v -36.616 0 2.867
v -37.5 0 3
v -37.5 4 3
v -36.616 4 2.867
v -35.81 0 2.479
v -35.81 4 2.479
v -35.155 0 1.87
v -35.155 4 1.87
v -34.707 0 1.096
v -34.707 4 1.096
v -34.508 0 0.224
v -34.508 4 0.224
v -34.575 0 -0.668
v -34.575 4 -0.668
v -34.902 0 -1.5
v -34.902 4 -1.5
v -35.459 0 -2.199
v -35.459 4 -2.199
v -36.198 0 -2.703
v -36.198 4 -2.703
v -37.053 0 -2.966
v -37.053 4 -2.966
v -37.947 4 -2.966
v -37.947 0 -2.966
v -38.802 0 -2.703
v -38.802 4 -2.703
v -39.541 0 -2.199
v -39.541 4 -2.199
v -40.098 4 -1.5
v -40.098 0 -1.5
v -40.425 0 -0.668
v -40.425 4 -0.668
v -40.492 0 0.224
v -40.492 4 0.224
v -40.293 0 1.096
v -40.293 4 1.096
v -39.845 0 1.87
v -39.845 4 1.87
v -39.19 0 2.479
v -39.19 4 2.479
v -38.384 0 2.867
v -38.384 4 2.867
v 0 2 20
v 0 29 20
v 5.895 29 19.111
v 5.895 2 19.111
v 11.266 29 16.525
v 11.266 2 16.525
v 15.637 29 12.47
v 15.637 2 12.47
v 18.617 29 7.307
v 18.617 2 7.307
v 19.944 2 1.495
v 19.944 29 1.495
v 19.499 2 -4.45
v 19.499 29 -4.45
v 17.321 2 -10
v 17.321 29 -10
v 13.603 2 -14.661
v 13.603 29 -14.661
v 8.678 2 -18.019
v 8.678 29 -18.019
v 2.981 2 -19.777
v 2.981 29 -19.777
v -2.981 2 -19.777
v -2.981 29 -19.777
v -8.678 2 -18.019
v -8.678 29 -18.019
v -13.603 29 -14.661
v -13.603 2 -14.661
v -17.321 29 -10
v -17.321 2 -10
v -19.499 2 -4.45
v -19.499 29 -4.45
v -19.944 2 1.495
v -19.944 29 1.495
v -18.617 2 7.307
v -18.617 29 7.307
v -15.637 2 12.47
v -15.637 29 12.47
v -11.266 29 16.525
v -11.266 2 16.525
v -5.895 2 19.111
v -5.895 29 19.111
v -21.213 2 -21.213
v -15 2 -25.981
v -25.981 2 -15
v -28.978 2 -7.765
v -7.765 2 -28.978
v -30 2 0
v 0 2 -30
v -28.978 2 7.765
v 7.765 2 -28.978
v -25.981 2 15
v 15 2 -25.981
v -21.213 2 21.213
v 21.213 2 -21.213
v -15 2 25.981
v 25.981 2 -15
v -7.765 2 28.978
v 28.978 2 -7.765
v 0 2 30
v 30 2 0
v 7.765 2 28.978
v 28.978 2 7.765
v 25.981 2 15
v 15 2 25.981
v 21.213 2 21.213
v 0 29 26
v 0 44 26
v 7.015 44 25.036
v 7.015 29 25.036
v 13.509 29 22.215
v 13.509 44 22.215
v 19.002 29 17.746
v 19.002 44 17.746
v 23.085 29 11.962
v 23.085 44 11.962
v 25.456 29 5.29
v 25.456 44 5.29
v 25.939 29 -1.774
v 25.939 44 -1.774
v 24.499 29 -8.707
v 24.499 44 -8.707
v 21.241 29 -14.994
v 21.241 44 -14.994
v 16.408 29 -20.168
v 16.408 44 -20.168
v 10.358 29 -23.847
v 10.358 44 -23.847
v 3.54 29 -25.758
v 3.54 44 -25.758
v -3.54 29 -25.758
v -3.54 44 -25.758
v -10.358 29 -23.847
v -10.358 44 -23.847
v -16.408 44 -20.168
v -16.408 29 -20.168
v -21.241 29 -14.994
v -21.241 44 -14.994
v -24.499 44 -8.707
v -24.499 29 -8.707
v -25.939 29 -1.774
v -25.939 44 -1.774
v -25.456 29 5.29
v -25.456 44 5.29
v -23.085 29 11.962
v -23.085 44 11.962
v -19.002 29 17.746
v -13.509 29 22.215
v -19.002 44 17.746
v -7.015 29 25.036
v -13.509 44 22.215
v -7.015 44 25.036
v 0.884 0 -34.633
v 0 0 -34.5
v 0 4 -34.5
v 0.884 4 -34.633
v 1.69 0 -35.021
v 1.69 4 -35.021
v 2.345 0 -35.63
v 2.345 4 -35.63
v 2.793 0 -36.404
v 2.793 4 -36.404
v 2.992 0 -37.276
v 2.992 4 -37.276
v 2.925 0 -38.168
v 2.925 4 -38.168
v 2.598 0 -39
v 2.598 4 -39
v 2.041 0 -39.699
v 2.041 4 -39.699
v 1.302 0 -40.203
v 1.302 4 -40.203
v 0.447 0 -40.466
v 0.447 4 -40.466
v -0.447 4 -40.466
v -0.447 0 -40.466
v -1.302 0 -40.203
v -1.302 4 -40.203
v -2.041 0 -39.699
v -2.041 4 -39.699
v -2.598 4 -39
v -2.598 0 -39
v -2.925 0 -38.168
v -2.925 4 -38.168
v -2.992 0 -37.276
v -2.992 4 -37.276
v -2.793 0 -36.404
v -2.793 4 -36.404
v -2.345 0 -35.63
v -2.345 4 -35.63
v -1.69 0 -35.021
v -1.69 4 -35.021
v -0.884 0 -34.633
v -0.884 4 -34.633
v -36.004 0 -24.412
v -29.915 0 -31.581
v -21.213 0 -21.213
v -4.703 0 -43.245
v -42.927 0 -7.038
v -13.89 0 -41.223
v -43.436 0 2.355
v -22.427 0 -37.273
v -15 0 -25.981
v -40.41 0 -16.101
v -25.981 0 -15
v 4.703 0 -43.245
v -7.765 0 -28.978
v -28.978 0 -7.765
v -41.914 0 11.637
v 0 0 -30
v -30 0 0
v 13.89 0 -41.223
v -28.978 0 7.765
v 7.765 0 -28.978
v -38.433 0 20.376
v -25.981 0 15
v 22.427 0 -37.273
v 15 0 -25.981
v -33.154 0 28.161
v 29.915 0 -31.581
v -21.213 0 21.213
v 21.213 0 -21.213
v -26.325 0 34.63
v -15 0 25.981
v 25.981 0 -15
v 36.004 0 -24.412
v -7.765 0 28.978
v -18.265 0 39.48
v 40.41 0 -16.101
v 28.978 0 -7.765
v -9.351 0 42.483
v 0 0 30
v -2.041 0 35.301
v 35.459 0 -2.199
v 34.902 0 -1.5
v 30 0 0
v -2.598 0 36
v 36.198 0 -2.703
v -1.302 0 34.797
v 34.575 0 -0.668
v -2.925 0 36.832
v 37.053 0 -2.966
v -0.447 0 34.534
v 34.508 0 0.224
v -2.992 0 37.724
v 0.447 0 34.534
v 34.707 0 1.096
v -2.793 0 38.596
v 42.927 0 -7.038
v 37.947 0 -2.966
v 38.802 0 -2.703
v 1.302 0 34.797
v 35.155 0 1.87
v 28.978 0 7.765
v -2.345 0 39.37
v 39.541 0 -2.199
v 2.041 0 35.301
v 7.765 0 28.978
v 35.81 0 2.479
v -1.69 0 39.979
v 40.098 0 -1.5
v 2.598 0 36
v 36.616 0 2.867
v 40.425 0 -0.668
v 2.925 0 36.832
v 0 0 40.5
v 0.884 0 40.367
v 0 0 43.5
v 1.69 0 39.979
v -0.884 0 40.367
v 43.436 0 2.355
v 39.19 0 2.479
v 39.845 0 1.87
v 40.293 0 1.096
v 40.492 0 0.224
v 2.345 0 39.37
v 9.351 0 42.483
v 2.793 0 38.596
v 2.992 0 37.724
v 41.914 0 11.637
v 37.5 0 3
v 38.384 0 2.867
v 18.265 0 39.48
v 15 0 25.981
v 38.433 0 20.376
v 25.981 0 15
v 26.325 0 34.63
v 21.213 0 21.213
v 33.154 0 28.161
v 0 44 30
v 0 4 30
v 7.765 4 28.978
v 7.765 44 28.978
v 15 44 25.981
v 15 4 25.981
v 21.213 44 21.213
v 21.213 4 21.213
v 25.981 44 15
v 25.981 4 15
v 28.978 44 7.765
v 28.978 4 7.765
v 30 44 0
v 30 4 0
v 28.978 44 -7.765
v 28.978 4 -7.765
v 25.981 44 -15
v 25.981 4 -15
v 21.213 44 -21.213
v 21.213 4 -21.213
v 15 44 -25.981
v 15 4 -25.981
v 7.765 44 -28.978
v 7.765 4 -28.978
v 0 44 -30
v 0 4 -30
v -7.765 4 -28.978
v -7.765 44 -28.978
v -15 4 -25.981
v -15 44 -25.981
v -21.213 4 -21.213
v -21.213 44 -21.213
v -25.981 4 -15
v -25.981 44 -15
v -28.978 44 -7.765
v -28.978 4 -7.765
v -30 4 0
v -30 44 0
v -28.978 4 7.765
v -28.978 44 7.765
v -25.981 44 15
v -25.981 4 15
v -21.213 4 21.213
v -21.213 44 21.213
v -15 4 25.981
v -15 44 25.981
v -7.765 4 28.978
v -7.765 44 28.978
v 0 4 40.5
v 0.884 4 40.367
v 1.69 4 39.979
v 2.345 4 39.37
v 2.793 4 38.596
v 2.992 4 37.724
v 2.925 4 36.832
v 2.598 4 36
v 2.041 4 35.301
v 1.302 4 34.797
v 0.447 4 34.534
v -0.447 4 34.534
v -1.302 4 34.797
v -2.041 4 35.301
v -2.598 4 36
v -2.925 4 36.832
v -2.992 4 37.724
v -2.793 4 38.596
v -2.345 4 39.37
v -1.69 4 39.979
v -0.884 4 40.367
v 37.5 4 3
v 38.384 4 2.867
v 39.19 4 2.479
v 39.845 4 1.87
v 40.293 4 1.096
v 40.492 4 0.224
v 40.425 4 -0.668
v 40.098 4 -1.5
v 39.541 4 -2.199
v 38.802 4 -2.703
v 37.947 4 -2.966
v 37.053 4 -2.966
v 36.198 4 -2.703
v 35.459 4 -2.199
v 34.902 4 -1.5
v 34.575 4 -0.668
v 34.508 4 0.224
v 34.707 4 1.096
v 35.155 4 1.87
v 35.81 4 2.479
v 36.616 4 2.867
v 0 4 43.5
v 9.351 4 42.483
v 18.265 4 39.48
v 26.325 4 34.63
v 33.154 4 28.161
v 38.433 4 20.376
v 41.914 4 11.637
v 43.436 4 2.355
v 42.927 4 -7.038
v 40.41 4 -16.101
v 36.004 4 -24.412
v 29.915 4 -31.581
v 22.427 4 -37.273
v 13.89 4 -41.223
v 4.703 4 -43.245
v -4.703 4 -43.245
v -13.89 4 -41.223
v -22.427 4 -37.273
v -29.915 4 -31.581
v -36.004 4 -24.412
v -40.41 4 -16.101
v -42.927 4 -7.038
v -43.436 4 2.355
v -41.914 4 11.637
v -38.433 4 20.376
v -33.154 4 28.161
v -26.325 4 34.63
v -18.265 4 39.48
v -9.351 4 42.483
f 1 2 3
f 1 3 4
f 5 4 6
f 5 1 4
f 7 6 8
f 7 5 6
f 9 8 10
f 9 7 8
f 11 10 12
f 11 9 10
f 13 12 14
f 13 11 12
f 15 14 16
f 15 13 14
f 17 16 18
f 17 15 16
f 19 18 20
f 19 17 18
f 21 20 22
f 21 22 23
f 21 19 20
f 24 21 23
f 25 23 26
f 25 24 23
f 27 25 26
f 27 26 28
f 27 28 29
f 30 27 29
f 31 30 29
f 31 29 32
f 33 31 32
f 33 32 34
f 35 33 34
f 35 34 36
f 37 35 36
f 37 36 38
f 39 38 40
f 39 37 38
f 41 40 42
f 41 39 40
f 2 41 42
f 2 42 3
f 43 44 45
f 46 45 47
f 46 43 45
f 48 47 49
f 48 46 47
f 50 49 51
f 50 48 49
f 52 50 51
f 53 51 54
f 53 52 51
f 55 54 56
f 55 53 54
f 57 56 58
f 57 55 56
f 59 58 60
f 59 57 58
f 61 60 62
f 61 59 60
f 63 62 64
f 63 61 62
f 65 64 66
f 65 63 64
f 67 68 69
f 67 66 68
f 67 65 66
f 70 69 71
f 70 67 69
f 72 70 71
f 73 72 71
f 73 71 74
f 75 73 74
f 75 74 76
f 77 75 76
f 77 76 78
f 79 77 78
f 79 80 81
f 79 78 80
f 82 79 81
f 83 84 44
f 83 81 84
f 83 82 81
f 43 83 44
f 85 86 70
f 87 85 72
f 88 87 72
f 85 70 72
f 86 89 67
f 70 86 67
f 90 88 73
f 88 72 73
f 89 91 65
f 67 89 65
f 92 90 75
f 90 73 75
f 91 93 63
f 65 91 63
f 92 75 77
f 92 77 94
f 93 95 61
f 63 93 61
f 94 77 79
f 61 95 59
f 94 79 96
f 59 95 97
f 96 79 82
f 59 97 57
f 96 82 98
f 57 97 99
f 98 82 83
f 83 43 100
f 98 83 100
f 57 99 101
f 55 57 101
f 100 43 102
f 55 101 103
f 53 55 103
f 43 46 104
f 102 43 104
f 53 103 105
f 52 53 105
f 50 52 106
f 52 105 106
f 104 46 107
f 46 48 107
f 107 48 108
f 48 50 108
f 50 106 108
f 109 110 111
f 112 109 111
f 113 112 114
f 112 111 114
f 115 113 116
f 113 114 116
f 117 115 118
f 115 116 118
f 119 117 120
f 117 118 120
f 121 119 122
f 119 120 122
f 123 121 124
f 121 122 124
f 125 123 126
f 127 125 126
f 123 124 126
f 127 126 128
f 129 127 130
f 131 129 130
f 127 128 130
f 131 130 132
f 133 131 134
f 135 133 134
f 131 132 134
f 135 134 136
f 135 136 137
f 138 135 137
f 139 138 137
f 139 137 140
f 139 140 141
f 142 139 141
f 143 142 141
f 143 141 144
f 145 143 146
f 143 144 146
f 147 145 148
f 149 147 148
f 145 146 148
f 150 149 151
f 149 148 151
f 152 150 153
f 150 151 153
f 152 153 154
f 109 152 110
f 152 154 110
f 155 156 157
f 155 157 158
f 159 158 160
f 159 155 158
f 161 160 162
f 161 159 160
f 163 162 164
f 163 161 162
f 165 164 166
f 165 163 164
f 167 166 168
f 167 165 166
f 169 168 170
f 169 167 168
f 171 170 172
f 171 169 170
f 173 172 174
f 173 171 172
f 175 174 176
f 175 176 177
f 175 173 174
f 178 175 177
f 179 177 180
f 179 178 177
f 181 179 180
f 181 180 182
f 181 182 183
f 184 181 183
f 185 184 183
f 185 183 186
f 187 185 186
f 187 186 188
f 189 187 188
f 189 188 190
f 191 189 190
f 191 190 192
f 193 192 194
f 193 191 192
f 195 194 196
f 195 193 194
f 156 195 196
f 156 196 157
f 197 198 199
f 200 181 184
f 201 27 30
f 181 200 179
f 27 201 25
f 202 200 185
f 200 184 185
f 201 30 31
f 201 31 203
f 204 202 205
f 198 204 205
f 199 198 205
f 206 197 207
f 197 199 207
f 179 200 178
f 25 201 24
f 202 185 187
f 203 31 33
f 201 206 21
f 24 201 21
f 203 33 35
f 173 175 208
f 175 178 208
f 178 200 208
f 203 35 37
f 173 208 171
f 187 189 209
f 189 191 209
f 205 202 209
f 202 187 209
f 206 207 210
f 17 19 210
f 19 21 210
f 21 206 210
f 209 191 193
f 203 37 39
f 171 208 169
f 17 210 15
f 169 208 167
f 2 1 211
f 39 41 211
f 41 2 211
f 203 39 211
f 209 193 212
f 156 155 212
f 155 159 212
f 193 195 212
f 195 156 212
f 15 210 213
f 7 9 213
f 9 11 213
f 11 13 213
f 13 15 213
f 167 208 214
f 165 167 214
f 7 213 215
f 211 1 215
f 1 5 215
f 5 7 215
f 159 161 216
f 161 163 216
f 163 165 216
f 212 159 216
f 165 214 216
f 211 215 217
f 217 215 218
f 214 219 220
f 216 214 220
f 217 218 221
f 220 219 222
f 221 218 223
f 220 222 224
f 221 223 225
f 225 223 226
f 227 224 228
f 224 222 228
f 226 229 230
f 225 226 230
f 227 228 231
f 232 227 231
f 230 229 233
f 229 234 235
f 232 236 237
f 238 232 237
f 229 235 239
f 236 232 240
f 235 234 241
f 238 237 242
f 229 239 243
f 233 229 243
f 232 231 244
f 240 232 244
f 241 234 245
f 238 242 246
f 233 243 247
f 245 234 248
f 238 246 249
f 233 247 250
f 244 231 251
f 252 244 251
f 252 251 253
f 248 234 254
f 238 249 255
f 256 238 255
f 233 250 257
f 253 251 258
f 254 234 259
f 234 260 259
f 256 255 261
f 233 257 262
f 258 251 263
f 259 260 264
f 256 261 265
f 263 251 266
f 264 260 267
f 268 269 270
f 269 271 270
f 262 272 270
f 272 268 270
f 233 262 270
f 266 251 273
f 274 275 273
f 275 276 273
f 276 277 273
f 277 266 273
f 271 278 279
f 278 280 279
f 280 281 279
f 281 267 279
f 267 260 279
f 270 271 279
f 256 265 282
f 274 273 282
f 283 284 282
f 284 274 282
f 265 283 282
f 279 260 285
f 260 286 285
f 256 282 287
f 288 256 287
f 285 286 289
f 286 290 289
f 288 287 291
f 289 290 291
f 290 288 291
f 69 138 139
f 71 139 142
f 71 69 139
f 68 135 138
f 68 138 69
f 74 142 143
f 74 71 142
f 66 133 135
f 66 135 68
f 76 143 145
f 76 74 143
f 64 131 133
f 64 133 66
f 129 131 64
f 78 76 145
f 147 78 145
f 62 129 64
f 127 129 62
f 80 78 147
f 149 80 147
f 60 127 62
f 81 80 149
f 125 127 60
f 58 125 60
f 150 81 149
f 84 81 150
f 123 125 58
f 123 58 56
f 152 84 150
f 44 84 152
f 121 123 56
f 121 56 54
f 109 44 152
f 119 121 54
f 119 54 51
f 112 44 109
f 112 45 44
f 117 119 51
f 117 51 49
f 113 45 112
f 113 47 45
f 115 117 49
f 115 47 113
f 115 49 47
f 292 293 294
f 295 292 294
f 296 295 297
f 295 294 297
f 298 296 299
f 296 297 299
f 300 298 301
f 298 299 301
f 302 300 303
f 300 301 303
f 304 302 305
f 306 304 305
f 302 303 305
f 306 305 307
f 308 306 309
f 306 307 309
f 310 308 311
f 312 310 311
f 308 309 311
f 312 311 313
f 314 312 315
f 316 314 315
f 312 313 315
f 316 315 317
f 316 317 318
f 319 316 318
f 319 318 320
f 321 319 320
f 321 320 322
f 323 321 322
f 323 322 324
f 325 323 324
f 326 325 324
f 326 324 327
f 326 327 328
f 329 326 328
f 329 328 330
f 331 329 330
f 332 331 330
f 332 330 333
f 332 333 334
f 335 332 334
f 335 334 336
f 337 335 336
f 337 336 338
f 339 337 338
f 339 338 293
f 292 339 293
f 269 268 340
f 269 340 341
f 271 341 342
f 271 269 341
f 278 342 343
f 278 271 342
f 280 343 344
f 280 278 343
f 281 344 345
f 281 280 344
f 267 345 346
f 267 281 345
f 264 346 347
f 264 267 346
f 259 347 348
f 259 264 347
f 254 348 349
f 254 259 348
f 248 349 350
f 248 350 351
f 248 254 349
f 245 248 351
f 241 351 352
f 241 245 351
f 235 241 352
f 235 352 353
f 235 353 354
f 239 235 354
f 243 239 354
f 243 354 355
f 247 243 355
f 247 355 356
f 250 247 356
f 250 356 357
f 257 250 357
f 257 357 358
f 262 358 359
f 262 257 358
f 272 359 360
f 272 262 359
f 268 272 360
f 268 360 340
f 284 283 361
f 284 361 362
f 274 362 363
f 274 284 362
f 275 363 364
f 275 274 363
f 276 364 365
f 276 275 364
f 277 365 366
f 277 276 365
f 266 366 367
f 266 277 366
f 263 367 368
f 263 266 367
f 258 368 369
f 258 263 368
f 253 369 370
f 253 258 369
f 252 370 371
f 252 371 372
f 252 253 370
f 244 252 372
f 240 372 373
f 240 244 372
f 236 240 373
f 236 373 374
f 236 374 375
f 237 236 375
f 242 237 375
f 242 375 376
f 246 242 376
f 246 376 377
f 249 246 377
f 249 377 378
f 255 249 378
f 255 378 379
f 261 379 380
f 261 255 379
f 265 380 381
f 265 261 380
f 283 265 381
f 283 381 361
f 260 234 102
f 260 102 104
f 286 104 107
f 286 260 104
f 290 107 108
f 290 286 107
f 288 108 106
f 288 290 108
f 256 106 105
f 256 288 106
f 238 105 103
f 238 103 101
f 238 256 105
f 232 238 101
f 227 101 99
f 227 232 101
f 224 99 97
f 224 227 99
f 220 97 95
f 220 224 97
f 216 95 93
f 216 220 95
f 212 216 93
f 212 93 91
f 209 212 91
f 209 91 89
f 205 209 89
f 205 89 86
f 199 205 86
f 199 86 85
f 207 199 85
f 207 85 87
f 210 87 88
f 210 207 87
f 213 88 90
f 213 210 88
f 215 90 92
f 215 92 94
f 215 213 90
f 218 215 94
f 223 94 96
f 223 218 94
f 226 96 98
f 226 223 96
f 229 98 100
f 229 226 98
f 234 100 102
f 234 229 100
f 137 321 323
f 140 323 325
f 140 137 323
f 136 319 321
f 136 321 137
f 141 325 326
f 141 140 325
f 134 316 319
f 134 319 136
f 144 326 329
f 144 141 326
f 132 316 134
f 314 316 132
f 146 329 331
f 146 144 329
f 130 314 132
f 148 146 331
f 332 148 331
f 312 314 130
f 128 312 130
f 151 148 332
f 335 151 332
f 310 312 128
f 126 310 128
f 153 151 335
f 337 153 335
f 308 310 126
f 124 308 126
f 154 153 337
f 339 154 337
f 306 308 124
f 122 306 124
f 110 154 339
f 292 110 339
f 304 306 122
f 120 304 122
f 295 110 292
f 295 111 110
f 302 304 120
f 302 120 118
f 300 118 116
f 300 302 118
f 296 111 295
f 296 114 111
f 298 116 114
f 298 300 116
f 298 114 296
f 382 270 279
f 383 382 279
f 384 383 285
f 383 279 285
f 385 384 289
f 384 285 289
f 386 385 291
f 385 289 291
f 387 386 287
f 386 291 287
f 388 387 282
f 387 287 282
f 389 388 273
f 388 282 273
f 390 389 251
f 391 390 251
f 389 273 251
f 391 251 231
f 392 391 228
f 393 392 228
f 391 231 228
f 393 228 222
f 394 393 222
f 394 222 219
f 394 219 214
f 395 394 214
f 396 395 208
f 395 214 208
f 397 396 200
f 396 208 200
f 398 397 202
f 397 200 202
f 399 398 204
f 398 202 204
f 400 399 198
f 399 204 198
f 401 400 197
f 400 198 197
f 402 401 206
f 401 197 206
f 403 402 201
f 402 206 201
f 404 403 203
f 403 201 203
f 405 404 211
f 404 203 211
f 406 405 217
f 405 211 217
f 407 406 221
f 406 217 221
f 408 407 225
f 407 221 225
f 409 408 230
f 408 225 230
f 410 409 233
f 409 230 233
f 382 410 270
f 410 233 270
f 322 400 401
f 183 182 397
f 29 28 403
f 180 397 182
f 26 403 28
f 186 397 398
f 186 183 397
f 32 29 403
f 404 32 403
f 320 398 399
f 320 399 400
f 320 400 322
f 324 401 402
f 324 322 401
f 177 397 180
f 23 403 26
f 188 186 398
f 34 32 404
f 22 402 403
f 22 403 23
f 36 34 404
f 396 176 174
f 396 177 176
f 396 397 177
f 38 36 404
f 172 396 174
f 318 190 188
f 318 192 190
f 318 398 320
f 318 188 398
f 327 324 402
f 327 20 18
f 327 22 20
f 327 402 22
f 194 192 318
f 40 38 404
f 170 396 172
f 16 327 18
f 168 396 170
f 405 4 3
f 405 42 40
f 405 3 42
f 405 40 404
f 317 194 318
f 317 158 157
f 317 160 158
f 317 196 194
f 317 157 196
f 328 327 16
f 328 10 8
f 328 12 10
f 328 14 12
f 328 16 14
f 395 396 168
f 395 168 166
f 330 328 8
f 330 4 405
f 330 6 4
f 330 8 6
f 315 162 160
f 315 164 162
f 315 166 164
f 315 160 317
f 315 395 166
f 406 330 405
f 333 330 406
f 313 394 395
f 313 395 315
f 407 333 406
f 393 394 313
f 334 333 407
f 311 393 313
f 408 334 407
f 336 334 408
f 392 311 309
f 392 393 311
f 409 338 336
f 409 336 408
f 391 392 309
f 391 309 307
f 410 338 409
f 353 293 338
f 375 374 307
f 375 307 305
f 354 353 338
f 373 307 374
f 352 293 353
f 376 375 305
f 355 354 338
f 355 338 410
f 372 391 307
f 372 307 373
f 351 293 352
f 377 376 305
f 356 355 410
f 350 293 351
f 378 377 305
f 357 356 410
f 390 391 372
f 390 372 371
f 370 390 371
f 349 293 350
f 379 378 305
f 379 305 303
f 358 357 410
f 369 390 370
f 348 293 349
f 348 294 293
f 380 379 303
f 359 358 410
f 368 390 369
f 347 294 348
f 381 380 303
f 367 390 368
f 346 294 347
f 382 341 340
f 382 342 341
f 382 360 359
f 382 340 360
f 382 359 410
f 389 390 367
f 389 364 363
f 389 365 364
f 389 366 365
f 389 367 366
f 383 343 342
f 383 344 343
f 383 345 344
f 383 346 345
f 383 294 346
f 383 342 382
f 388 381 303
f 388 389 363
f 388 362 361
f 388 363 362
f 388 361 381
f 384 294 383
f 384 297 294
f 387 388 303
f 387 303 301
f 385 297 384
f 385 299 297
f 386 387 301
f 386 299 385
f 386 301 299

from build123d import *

# Parameters (mm, degrees)
CROQUIS1_R              = 43.5
CROQUIS1_R_2            = 30
SALIENTE_EXTRUIR1_DEPTH = 4
CROQUIS2_R              = 30
CROQUIS2_R_2            = 20
SALIENTE_EXTRUIR2_DEPTH = 44
CROQUIS3_R              = 30
CROQUIS3_R_2            = 20
CORTAR_EXTRUIR1_DEPTH   = 2
CROQUIS4_R              = 26
CORTAR_EXTRUIR2_DEPTH   = 15
CROQUIS5_R              = 3
CORTAR_EXTRUIR3_DEPTH   = 4


with BuildPart() as part:
    # Croquis1 → Saliente-Extruir1 (new body)
    with BuildSketch(Plane(origin=(0, 0, 0), x_dir=(1, 0, 0), z_dir=(0, 1, 0))):
        with Locations(Location((0, 0, 0), (0, 0, 270))):
            Circle(CROQUIS1_R)
        with Locations(Location((0, 0, 0), (0, 0, 270))):
            Circle(CROQUIS1_R_2, mode=Mode.SUBTRACT)
    extrude(amount=SALIENTE_EXTRUIR1_DEPTH)

    # Croquis2 → Saliente-Extruir2 (add)
    with BuildSketch(Plane(origin=(0, 0, 0), x_dir=(1, 0, 0), z_dir=(0, 1, 0))):
        with Locations(Location((0, 0, 0), (0, 0, 270))):
            Circle(CROQUIS2_R)
        with Locations(Location((0, 0, 0), (0, 0, 270))):
            Circle(CROQUIS2_R_2, mode=Mode.SUBTRACT)
    extrude(amount=SALIENTE_EXTRUIR2_DEPTH)

    # Croquis3 → Cortar-Extruir1 (cut)
    with BuildSketch(Plane(origin=(0, 0, 0), x_dir=(1, 0, 0), z_dir=(0, 1, 0))):
        with Locations(Location((0, 0, 0), (0, 0, 270))):
            Circle(CROQUIS3_R)
        with Locations(Location((0, 0, 0), (0, 0, 270))):
            Circle(CROQUIS3_R_2, mode=Mode.SUBTRACT)
    extrude(amount=CORTAR_EXTRUIR1_DEPTH, mode=Mode.SUBTRACT)

    # Croquis4 → Cortar-Extruir2 (cut)
    with BuildSketch(Plane(origin=(0, 44, 0), x_dir=(1, 0, 0), z_dir=(0, 1, 0))):
        with Locations(Location((0, 0, 0), (0, 0, 270))):
            Circle(CROQUIS4_R)
    extrude(amount=-CORTAR_EXTRUIR2_DEPTH, mode=Mode.SUBTRACT)

    # Croquis5 → Cortar-Extruir3 (cut)
    with BuildSketch(Plane(origin=(0, 0, 0), x_dir=(1, 0, 0), z_dir=(0, 1, 0))):
        with Locations(Location((0, -37.5, 0), (0, 0, 270))):
            Circle(CROQUIS5_R)
        with Locations(Location((-37.5, 0, 0), (0, 0, 270))):
            Circle(CROQUIS5_R)
        with Locations(Location((0, 37.5, 0), (0, 0, 270))):
            Circle(CROQUIS5_R)
        with Locations(Location((37.5, 0, 0), (0, 0, 270))):
            Circle(CROQUIS5_R)
    extrude(amount=CORTAR_EXTRUIR3_DEPTH, mode=Mode.SUBTRACT)


solid = part.part
